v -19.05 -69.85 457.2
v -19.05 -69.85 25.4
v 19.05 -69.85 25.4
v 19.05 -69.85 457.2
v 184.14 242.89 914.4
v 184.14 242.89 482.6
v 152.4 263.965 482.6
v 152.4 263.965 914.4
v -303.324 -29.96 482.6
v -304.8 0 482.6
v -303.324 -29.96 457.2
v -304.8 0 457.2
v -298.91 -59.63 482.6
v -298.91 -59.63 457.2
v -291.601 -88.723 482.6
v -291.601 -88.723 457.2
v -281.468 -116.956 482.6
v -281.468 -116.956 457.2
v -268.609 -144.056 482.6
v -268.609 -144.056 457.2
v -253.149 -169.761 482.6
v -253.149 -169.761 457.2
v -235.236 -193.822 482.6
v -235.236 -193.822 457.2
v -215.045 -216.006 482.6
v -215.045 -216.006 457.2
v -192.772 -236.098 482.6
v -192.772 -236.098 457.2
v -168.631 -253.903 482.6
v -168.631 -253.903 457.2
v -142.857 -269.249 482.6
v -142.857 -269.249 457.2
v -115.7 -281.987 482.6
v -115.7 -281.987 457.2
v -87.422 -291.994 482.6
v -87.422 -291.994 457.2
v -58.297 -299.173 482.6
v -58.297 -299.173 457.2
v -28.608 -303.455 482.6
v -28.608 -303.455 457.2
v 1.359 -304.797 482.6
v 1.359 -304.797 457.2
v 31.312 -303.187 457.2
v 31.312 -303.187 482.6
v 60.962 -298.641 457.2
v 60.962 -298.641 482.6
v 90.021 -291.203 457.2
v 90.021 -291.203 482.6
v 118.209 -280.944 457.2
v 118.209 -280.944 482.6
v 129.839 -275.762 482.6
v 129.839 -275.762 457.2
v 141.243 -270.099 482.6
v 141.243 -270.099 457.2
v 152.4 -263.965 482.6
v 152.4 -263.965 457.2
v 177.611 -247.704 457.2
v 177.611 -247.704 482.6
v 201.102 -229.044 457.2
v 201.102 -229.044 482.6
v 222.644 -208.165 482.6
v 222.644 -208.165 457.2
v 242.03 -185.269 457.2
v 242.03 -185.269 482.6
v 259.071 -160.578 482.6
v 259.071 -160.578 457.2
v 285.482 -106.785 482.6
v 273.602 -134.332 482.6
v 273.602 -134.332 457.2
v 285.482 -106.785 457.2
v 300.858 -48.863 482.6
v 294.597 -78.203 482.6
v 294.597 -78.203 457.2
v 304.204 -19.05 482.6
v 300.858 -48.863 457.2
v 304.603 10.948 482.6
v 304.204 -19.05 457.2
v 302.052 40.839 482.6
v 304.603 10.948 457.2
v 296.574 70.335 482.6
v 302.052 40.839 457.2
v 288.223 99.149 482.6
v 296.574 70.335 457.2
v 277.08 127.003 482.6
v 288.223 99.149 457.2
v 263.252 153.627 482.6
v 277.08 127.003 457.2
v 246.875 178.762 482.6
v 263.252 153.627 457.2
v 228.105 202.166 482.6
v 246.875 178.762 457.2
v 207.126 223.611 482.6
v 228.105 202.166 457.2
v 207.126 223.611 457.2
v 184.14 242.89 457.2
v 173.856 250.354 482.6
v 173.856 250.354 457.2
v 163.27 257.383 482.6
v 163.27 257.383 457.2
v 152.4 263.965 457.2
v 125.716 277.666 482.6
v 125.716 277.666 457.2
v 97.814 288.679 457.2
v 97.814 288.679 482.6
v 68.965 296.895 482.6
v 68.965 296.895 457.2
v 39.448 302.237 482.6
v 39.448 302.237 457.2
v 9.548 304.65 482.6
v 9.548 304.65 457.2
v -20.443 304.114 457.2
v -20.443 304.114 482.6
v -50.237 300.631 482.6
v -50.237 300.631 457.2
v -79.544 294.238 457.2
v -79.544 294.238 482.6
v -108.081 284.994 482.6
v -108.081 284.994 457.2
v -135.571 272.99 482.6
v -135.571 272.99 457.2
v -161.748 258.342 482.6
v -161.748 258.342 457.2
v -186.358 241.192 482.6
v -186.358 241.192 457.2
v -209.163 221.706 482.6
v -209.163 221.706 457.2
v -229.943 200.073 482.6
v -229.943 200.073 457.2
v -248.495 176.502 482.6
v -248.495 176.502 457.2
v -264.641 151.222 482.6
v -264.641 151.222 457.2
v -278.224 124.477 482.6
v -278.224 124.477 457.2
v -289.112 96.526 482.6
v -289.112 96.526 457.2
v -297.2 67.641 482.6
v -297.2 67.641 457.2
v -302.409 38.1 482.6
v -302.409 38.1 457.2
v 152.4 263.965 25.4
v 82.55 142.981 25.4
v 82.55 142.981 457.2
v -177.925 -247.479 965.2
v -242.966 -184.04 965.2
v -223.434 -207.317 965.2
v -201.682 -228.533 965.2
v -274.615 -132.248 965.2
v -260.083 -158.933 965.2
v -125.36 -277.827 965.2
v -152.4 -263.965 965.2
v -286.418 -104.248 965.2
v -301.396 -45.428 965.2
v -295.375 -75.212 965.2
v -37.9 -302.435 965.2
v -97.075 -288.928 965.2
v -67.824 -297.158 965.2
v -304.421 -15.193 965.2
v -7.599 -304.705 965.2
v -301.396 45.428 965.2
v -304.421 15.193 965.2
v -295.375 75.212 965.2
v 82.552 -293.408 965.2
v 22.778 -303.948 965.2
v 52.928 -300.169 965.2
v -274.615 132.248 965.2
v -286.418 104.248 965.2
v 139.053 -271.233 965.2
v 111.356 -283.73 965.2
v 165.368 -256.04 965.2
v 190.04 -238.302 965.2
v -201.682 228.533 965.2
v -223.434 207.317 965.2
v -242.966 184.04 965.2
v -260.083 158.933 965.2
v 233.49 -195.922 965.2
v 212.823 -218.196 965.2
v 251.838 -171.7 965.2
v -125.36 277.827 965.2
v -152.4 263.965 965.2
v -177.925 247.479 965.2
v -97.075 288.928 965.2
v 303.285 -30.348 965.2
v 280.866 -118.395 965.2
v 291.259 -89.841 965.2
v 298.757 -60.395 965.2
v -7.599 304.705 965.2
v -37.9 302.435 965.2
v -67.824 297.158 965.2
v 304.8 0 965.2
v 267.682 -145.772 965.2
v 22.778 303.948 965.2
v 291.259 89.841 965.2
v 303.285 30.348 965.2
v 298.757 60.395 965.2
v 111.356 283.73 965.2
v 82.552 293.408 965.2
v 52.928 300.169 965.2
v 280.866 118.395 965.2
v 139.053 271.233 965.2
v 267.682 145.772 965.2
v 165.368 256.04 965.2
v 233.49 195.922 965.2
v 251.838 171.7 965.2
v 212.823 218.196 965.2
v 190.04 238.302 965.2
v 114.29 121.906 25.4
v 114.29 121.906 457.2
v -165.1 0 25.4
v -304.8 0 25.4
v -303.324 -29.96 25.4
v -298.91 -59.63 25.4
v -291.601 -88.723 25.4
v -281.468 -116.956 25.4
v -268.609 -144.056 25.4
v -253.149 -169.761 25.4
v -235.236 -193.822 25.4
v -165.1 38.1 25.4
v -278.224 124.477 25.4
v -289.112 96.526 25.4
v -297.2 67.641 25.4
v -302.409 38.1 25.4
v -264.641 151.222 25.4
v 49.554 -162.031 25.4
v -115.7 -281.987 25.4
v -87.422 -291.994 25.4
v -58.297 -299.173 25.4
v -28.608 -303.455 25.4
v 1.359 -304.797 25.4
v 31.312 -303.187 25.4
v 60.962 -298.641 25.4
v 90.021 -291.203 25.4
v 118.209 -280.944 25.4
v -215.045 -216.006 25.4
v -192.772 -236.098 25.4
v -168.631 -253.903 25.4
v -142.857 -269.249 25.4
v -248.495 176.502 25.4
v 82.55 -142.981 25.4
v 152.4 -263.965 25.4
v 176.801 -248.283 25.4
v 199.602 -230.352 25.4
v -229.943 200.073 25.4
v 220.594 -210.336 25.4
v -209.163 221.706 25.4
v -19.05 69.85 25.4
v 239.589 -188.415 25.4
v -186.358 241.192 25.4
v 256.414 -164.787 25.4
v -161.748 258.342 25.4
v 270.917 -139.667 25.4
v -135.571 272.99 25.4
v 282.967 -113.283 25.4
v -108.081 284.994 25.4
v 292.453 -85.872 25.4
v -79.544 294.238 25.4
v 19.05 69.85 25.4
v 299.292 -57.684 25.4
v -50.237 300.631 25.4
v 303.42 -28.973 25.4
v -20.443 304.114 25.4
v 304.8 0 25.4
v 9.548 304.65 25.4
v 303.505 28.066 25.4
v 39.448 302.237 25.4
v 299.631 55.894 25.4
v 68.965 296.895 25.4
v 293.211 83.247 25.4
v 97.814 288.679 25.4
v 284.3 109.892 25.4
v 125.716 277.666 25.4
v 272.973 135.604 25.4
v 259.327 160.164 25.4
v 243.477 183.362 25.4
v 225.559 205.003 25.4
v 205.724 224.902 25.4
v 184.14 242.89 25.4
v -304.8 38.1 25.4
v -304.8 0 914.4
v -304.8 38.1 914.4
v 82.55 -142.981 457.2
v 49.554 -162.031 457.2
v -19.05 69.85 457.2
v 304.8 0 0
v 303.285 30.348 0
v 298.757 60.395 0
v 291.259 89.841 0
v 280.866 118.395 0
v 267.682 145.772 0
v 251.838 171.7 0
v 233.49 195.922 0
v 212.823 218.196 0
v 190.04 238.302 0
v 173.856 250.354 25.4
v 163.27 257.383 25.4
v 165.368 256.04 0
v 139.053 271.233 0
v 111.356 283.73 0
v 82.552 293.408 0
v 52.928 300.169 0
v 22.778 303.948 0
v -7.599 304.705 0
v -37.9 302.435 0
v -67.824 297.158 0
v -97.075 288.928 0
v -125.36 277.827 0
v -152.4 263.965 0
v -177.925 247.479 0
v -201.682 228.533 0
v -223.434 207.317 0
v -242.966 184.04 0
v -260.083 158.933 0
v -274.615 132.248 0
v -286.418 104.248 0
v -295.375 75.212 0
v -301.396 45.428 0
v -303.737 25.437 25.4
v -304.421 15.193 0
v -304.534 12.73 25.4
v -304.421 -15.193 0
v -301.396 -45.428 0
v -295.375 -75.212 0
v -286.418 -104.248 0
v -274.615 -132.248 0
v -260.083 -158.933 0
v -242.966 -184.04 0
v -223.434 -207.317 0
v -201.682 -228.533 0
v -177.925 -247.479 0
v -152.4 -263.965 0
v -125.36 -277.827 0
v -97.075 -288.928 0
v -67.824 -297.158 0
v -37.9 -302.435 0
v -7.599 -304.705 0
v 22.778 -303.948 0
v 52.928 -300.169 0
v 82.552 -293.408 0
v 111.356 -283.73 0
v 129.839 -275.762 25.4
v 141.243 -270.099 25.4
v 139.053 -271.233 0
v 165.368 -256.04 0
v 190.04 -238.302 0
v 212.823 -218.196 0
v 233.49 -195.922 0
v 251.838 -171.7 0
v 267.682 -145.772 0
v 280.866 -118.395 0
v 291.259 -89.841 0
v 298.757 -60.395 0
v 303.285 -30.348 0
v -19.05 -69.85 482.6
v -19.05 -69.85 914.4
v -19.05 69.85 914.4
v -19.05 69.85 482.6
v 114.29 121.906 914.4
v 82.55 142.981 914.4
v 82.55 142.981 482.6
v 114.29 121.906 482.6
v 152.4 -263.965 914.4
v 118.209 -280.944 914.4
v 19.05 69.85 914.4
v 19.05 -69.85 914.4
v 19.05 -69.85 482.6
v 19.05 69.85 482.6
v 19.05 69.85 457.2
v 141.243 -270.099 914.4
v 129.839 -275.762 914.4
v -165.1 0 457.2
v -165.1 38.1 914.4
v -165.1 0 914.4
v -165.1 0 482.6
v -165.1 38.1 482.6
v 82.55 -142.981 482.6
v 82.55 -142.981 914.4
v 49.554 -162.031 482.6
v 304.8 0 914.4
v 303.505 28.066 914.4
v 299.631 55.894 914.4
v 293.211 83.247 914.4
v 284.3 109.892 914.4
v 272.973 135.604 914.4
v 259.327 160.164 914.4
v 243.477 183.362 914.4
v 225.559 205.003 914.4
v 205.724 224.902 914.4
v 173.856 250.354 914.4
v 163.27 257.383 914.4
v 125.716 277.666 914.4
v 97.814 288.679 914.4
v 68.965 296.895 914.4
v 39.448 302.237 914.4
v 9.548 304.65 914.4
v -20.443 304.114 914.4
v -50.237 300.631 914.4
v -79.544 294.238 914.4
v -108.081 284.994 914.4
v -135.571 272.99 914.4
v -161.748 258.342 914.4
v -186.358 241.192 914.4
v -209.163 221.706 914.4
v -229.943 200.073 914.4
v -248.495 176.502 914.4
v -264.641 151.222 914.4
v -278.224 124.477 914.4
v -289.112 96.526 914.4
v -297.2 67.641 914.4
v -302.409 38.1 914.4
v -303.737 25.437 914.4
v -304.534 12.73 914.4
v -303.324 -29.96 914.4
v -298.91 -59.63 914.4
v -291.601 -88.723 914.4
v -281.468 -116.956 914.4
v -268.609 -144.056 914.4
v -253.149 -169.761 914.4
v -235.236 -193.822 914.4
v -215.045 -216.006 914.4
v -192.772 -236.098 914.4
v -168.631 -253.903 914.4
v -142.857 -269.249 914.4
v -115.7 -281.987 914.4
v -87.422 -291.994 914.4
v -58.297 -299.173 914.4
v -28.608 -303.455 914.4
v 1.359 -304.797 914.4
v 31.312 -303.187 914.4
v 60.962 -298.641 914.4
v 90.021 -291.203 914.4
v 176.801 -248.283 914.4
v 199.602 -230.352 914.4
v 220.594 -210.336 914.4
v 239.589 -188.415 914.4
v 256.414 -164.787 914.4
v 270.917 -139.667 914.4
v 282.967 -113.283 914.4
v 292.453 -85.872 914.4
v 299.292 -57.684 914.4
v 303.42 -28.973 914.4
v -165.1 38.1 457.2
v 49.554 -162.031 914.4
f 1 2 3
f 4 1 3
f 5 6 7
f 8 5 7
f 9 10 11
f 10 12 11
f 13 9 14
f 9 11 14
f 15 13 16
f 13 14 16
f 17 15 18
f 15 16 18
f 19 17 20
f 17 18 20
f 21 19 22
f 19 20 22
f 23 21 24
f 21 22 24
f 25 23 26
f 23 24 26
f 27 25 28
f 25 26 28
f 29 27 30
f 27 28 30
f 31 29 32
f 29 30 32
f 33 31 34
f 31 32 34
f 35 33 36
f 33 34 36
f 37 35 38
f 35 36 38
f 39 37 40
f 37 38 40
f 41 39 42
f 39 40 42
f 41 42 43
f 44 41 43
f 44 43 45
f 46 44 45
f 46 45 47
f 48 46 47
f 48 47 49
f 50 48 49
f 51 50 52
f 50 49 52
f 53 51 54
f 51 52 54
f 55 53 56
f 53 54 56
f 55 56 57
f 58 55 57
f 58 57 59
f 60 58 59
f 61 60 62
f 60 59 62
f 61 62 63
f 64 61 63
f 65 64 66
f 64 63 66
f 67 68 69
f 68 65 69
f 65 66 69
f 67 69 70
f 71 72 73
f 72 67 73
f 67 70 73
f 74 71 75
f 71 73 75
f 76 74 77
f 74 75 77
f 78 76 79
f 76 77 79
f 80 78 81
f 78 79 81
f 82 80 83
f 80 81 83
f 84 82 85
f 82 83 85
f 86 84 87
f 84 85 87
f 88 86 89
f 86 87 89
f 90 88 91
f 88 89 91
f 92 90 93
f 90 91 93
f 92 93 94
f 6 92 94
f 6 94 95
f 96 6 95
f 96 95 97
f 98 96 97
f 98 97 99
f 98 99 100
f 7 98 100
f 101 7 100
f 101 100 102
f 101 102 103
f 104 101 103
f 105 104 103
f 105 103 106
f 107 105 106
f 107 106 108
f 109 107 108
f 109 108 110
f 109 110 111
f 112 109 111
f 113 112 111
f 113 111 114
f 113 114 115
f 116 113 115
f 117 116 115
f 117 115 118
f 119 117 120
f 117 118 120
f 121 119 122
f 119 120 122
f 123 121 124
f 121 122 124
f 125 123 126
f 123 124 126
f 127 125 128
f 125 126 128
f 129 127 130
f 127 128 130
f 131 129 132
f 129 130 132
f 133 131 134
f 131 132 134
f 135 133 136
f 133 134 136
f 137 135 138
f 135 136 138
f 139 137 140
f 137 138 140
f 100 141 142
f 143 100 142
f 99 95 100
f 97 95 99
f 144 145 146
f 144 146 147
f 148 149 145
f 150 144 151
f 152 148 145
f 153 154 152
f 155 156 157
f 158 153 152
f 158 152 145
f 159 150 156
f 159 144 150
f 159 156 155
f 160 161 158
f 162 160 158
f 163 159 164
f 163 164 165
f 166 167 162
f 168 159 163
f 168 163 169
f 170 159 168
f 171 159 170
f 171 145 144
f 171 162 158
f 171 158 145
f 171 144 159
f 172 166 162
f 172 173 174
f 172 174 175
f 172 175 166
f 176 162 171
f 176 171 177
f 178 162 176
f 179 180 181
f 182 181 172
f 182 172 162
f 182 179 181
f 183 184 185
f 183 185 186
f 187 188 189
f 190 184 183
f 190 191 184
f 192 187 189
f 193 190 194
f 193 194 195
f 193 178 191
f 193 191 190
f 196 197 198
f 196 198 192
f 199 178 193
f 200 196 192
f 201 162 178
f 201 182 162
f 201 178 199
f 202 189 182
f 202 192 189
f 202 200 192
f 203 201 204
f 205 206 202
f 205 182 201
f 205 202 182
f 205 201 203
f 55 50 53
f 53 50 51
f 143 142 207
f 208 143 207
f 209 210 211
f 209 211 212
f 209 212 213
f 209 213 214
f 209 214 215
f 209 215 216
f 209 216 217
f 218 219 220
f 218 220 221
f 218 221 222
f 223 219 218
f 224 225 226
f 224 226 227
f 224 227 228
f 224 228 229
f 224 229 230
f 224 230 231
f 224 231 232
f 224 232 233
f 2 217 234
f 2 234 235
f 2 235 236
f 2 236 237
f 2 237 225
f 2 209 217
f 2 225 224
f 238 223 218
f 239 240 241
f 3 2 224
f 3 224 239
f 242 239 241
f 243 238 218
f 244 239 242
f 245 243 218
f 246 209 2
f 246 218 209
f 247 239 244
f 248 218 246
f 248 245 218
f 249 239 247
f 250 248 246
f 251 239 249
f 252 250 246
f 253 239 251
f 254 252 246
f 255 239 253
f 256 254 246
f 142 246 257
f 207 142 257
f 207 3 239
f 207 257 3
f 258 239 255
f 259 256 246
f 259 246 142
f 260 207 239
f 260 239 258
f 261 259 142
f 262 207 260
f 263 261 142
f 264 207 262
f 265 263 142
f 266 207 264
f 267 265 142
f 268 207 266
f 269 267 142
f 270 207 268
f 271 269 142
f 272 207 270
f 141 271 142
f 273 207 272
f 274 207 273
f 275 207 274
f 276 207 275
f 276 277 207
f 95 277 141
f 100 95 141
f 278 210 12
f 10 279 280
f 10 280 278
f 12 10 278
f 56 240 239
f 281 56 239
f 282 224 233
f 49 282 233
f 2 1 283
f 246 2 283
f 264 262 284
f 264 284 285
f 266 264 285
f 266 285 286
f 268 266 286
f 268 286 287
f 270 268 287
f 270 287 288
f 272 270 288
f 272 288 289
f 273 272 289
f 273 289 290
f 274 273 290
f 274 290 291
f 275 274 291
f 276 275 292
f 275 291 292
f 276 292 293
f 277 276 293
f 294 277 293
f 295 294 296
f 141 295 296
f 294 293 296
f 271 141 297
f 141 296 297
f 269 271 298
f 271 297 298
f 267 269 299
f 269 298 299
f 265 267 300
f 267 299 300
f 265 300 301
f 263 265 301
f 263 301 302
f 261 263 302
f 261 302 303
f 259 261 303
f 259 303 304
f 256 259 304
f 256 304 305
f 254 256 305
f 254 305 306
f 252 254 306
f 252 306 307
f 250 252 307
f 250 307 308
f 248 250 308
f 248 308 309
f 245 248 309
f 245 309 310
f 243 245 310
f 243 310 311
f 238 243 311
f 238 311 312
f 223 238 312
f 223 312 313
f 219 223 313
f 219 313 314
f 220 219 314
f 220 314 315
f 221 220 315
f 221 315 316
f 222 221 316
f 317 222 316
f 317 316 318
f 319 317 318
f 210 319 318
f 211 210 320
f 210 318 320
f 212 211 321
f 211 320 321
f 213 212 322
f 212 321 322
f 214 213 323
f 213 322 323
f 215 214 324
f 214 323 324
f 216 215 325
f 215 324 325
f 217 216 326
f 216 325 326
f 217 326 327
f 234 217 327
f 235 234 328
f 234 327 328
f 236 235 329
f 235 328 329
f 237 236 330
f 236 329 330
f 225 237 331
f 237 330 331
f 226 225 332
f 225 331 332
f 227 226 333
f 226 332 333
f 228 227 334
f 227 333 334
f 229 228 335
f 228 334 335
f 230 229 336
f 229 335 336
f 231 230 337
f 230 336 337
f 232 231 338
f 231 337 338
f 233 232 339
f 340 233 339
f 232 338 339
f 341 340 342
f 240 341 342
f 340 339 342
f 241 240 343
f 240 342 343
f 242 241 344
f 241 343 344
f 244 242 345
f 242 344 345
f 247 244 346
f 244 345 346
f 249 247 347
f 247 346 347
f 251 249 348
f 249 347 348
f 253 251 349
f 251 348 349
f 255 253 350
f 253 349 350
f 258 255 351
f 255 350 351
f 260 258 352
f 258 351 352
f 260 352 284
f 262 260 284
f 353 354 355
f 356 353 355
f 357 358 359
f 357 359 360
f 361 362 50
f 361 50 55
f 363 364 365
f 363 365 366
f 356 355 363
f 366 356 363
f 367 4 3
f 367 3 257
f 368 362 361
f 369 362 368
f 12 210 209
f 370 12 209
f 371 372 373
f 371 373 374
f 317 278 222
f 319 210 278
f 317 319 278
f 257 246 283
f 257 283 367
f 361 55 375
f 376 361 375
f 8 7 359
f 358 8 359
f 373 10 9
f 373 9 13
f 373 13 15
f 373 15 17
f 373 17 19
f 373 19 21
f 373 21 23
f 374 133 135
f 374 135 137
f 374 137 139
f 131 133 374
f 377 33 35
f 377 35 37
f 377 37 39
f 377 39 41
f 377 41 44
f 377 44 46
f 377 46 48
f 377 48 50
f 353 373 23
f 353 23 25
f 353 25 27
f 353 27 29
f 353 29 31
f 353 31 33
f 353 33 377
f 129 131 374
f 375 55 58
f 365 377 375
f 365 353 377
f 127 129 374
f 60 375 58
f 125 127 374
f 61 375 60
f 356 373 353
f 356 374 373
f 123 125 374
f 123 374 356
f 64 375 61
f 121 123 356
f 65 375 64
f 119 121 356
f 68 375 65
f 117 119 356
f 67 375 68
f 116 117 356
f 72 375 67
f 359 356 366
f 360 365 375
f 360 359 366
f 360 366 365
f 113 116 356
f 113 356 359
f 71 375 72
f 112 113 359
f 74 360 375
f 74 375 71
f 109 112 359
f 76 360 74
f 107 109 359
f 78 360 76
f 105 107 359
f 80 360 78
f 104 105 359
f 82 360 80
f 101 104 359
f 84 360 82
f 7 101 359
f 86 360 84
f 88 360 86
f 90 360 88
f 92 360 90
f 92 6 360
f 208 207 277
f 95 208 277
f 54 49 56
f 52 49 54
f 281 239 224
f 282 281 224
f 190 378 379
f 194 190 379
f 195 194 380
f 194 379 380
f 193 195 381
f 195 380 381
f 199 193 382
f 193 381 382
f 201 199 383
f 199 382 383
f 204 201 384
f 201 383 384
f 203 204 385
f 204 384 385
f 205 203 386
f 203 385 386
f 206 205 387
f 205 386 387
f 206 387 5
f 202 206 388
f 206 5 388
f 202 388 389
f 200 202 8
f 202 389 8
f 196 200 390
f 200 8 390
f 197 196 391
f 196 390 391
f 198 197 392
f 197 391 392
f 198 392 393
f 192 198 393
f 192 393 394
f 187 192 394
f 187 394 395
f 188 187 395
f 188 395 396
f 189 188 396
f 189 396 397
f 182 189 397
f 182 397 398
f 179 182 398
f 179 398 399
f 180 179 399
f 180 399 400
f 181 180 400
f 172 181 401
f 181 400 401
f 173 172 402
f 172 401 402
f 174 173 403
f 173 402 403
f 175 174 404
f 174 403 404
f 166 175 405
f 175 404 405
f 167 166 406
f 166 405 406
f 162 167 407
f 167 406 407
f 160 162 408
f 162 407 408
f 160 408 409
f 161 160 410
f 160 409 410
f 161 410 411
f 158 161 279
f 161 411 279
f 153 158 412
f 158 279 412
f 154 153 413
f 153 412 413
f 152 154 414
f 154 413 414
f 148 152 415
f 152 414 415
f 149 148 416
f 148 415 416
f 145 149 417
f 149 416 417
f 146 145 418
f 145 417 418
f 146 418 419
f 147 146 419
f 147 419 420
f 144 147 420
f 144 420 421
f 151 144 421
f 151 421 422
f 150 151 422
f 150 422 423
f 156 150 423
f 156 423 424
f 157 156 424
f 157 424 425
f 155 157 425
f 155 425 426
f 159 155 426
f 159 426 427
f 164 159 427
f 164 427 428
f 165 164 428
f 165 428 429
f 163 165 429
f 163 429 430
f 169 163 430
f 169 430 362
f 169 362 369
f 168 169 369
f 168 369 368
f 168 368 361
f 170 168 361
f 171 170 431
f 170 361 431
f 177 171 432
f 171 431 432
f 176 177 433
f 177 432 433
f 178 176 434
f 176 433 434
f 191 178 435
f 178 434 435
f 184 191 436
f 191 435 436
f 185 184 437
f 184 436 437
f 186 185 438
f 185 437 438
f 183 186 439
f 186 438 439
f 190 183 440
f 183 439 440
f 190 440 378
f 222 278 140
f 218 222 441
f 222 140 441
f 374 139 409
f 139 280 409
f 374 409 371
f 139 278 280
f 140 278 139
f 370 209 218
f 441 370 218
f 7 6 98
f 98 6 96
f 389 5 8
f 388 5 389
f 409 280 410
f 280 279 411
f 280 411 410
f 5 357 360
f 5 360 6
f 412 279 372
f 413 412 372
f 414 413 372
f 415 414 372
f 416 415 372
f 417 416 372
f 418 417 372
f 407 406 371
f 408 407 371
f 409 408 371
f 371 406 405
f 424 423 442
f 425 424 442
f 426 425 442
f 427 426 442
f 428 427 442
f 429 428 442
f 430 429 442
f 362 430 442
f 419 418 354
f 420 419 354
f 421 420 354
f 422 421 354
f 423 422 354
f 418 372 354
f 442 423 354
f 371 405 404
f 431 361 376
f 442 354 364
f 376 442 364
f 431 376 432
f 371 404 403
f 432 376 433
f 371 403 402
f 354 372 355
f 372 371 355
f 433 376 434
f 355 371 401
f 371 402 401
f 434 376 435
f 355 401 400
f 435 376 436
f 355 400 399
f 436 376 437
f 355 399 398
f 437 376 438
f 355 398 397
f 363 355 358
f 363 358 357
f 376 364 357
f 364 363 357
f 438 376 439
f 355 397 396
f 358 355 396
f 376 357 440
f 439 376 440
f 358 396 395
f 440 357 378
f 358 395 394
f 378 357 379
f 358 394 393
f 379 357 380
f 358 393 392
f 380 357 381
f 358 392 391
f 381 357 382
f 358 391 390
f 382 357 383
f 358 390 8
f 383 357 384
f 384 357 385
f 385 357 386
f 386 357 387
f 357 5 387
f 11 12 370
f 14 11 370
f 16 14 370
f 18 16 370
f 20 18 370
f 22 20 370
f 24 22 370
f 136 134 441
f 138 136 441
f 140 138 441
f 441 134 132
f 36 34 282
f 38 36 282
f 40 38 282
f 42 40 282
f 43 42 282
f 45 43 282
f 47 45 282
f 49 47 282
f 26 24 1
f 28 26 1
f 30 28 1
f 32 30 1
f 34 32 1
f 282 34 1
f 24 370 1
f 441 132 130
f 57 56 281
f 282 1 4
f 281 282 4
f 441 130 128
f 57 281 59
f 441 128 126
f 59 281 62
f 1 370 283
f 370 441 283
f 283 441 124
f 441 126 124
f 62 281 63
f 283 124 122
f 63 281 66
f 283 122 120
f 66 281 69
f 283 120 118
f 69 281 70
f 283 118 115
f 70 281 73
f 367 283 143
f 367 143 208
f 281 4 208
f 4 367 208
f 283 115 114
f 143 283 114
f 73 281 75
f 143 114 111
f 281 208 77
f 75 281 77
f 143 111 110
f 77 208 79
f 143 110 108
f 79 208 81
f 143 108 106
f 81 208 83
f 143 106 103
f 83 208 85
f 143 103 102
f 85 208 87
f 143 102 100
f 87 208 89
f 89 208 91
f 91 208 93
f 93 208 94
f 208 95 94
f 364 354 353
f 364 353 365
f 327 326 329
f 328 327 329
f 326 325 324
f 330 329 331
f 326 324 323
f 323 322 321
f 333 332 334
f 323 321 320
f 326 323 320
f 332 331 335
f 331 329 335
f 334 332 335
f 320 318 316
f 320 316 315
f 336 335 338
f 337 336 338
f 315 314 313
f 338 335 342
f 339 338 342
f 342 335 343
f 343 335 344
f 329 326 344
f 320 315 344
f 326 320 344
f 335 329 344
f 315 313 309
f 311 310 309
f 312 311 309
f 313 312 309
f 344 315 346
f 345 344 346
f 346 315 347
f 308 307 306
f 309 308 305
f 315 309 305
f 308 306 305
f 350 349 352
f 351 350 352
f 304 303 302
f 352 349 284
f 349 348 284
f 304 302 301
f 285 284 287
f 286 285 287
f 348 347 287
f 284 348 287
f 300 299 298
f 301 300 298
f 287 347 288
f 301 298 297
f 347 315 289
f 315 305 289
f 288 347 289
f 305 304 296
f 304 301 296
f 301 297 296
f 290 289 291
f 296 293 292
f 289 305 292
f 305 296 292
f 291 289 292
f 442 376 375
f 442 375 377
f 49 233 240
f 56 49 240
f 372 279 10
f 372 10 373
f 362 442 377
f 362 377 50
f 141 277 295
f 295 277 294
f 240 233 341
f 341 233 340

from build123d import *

# Parameters (mm, degrees)
F0_R      = 304.8
F1_DEPTH  = 25.4
F3_R      = 304.8
F4_DEPTH  = 25.4
F7_W      = 139.7
F7_H      = 38.1
F7_W_2    = 38.1
F7_H_2    = 139.7
F8_DEPTH  = 431.8
F9_W      = 139.7
F9_H      = 38.1
F9_W_2    = 38.1
F9_H_2    = 139.7
F10_DEPTH = 457.2
F6_R      = 304.8
F11_DEPTH = 50.8


with BuildPart() as f1:
    # F0 (on Top) → F1 (new body)
    with BuildSketch(Plane.XY):
        Circle(F0_R)
    extrude(amount=F1_DEPTH)



with BuildPart() as f4:
    # F3 (on offset) → F4 (new body)
    with BuildSketch(Plane.XY.offset(457.2)):
        Circle(F3_R)
    extrude(amount=F4_DEPTH)


with BuildPart() as f1_1:
    add(f1.part)

    add(f4.part)  # F8 merges F4
    # F7 (on face) → F8 (join, through all)
    with BuildSketch(Plane.XY.offset(25.4)):
        with Locations((-234.95, 19.05)):
            Rectangle(F7_W, F7_H)
        Polygon((152.4, 263.9645430735), (82.55, 142.9807941648), (114.2904353584, 121.9058146094), (184.1404353584, 242.8895635181), align=None)
        Polygon((152.4, -263.9645430735), (82.55, -142.9807941648), (49.5544321158, -162.0307941648), (118.2091195432, -280.9442009667), align=None)
        Rectangle(F7_W_2, F7_H_2)
    extrude(amount=F8_DEPTH)

    # F9 (on face) → F10 (join, through all)
    with BuildSketch(Plane.XY.offset(914.4)):
        with Locations((-234.95, 19.05)):
            Rectangle(F9_W, F9_H)
        Polygon((152.4, 263.9645430735), (82.55, 142.9807941648), (114.2904353584, 121.9058146094), (184.1404353584, 242.8895635181), align=None)
        Polygon((152.4, -263.9645430735), (82.55, -142.9807941648), (49.5544321158, -162.0307941648), (118.2091195432, -280.9442009667), align=None)
        Rectangle(F9_W_2, F9_H_2)
    extrude(amount=-F10_DEPTH)

    # F6 (on offset) → F11 (join)
    with BuildSketch(Plane.XY.offset(914.4)):
        Circle(F6_R)
    extrude(amount=F11_DEPTH)


solid = f1_1.part
